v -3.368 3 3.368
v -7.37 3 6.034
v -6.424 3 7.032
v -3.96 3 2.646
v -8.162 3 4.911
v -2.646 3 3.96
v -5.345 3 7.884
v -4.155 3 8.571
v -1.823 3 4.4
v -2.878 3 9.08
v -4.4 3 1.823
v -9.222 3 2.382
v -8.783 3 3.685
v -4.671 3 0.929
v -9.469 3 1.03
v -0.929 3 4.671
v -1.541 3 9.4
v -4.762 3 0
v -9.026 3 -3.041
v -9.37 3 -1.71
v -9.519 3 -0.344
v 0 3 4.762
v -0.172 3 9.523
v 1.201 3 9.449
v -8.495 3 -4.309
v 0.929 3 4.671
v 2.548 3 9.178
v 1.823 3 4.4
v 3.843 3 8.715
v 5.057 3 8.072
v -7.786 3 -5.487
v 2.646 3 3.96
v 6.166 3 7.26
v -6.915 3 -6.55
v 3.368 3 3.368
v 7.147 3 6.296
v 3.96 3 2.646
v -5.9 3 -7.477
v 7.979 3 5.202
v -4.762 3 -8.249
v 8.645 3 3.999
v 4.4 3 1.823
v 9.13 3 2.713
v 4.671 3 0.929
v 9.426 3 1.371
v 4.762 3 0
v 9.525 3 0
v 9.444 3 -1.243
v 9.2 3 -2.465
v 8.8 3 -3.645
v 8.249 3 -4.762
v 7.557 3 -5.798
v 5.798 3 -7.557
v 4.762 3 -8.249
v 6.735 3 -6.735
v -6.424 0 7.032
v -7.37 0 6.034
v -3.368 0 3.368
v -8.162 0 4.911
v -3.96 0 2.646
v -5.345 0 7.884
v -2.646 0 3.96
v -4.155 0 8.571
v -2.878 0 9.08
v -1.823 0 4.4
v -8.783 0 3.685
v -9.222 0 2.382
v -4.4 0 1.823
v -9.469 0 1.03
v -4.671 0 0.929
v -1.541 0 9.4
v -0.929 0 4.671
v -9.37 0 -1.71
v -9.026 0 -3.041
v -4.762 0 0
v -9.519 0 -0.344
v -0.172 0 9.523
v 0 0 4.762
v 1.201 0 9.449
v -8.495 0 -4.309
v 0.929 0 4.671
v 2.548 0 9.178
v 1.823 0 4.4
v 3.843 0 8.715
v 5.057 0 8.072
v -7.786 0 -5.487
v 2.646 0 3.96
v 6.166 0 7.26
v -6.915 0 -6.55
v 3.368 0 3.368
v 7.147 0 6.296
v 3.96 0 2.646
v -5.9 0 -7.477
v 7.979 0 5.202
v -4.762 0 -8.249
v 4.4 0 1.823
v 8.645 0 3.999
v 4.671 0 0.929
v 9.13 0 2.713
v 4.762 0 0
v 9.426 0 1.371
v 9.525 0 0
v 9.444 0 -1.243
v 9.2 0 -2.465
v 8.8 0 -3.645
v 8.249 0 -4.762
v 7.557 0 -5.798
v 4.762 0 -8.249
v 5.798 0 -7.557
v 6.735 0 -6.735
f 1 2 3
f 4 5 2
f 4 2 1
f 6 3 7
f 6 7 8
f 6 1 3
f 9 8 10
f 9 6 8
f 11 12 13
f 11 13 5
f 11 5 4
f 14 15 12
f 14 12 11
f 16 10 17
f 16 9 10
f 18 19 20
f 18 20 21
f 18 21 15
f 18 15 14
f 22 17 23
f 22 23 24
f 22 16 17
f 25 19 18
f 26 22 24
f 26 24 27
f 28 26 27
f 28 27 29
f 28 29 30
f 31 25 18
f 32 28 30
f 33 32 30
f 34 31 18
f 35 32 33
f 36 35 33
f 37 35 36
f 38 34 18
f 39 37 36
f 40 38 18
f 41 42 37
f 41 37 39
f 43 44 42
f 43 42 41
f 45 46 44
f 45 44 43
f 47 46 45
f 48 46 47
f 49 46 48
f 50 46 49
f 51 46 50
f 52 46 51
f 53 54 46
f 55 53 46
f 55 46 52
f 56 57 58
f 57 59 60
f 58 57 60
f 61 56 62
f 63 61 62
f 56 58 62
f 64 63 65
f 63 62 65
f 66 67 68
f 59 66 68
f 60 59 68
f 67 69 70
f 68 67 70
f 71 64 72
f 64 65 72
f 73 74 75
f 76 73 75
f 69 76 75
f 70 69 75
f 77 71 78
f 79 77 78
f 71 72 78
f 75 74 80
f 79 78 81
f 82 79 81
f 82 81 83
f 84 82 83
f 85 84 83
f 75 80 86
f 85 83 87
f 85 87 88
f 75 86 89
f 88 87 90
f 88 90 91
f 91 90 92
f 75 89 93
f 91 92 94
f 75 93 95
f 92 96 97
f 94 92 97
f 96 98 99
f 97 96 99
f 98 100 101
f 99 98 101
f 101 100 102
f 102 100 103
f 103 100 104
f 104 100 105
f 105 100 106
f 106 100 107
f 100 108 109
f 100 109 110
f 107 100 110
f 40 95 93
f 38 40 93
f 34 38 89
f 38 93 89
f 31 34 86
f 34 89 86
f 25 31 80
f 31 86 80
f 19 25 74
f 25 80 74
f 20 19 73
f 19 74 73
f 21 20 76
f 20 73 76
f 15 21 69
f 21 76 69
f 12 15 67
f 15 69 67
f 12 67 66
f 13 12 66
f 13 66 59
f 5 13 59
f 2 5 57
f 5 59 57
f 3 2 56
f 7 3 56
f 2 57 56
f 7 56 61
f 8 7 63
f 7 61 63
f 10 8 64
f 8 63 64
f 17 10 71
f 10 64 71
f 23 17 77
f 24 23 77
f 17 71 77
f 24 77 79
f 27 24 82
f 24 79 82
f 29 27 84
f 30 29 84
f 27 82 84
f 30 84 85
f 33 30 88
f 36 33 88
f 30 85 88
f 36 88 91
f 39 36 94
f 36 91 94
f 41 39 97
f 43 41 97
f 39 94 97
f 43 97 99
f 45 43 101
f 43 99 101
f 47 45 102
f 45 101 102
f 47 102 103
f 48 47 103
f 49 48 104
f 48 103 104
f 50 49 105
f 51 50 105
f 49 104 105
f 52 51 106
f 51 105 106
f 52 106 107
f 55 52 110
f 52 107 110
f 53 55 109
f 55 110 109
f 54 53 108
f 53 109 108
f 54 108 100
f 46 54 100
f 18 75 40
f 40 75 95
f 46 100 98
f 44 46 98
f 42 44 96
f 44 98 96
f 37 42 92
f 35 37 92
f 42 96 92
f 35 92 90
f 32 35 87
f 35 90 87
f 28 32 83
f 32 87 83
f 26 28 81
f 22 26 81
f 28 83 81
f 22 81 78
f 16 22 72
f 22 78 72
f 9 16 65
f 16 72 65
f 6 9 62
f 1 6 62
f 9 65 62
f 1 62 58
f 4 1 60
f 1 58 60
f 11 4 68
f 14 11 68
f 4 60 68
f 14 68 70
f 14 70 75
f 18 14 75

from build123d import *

# Parameters (mm, degrees)
BOSS_EXTRUDE1_DEPTH = 3


with BuildPart() as part:
    # Sketch1 → Boss-Extrude1 (new body)
    with BuildSketch(Plane(origin=(0, 0, 0), x_dir=(1, 0, 0), z_dir=(0, 1, 0))):
        with BuildLine():
            ThreePointArc((4.7625, 0), (0, -4.7625), (-4.7625, 0))
            Line((-4.7625, 0), (-4.7625, 8.248891971))
            ThreePointArc((-4.7625, 8.248891971), (-4.7625, -8.248891971), (9.525, 0))
            ThreePointArc((9.525, 0), (8.248891971, 4.7625), (4.7625, 8.248891971))
            Line((4.7625, 8.248891971), (4.7625, 0))
        make_face()
    extrude(amount=BOSS_EXTRUDE1_DEPTH)


solid = part.part
